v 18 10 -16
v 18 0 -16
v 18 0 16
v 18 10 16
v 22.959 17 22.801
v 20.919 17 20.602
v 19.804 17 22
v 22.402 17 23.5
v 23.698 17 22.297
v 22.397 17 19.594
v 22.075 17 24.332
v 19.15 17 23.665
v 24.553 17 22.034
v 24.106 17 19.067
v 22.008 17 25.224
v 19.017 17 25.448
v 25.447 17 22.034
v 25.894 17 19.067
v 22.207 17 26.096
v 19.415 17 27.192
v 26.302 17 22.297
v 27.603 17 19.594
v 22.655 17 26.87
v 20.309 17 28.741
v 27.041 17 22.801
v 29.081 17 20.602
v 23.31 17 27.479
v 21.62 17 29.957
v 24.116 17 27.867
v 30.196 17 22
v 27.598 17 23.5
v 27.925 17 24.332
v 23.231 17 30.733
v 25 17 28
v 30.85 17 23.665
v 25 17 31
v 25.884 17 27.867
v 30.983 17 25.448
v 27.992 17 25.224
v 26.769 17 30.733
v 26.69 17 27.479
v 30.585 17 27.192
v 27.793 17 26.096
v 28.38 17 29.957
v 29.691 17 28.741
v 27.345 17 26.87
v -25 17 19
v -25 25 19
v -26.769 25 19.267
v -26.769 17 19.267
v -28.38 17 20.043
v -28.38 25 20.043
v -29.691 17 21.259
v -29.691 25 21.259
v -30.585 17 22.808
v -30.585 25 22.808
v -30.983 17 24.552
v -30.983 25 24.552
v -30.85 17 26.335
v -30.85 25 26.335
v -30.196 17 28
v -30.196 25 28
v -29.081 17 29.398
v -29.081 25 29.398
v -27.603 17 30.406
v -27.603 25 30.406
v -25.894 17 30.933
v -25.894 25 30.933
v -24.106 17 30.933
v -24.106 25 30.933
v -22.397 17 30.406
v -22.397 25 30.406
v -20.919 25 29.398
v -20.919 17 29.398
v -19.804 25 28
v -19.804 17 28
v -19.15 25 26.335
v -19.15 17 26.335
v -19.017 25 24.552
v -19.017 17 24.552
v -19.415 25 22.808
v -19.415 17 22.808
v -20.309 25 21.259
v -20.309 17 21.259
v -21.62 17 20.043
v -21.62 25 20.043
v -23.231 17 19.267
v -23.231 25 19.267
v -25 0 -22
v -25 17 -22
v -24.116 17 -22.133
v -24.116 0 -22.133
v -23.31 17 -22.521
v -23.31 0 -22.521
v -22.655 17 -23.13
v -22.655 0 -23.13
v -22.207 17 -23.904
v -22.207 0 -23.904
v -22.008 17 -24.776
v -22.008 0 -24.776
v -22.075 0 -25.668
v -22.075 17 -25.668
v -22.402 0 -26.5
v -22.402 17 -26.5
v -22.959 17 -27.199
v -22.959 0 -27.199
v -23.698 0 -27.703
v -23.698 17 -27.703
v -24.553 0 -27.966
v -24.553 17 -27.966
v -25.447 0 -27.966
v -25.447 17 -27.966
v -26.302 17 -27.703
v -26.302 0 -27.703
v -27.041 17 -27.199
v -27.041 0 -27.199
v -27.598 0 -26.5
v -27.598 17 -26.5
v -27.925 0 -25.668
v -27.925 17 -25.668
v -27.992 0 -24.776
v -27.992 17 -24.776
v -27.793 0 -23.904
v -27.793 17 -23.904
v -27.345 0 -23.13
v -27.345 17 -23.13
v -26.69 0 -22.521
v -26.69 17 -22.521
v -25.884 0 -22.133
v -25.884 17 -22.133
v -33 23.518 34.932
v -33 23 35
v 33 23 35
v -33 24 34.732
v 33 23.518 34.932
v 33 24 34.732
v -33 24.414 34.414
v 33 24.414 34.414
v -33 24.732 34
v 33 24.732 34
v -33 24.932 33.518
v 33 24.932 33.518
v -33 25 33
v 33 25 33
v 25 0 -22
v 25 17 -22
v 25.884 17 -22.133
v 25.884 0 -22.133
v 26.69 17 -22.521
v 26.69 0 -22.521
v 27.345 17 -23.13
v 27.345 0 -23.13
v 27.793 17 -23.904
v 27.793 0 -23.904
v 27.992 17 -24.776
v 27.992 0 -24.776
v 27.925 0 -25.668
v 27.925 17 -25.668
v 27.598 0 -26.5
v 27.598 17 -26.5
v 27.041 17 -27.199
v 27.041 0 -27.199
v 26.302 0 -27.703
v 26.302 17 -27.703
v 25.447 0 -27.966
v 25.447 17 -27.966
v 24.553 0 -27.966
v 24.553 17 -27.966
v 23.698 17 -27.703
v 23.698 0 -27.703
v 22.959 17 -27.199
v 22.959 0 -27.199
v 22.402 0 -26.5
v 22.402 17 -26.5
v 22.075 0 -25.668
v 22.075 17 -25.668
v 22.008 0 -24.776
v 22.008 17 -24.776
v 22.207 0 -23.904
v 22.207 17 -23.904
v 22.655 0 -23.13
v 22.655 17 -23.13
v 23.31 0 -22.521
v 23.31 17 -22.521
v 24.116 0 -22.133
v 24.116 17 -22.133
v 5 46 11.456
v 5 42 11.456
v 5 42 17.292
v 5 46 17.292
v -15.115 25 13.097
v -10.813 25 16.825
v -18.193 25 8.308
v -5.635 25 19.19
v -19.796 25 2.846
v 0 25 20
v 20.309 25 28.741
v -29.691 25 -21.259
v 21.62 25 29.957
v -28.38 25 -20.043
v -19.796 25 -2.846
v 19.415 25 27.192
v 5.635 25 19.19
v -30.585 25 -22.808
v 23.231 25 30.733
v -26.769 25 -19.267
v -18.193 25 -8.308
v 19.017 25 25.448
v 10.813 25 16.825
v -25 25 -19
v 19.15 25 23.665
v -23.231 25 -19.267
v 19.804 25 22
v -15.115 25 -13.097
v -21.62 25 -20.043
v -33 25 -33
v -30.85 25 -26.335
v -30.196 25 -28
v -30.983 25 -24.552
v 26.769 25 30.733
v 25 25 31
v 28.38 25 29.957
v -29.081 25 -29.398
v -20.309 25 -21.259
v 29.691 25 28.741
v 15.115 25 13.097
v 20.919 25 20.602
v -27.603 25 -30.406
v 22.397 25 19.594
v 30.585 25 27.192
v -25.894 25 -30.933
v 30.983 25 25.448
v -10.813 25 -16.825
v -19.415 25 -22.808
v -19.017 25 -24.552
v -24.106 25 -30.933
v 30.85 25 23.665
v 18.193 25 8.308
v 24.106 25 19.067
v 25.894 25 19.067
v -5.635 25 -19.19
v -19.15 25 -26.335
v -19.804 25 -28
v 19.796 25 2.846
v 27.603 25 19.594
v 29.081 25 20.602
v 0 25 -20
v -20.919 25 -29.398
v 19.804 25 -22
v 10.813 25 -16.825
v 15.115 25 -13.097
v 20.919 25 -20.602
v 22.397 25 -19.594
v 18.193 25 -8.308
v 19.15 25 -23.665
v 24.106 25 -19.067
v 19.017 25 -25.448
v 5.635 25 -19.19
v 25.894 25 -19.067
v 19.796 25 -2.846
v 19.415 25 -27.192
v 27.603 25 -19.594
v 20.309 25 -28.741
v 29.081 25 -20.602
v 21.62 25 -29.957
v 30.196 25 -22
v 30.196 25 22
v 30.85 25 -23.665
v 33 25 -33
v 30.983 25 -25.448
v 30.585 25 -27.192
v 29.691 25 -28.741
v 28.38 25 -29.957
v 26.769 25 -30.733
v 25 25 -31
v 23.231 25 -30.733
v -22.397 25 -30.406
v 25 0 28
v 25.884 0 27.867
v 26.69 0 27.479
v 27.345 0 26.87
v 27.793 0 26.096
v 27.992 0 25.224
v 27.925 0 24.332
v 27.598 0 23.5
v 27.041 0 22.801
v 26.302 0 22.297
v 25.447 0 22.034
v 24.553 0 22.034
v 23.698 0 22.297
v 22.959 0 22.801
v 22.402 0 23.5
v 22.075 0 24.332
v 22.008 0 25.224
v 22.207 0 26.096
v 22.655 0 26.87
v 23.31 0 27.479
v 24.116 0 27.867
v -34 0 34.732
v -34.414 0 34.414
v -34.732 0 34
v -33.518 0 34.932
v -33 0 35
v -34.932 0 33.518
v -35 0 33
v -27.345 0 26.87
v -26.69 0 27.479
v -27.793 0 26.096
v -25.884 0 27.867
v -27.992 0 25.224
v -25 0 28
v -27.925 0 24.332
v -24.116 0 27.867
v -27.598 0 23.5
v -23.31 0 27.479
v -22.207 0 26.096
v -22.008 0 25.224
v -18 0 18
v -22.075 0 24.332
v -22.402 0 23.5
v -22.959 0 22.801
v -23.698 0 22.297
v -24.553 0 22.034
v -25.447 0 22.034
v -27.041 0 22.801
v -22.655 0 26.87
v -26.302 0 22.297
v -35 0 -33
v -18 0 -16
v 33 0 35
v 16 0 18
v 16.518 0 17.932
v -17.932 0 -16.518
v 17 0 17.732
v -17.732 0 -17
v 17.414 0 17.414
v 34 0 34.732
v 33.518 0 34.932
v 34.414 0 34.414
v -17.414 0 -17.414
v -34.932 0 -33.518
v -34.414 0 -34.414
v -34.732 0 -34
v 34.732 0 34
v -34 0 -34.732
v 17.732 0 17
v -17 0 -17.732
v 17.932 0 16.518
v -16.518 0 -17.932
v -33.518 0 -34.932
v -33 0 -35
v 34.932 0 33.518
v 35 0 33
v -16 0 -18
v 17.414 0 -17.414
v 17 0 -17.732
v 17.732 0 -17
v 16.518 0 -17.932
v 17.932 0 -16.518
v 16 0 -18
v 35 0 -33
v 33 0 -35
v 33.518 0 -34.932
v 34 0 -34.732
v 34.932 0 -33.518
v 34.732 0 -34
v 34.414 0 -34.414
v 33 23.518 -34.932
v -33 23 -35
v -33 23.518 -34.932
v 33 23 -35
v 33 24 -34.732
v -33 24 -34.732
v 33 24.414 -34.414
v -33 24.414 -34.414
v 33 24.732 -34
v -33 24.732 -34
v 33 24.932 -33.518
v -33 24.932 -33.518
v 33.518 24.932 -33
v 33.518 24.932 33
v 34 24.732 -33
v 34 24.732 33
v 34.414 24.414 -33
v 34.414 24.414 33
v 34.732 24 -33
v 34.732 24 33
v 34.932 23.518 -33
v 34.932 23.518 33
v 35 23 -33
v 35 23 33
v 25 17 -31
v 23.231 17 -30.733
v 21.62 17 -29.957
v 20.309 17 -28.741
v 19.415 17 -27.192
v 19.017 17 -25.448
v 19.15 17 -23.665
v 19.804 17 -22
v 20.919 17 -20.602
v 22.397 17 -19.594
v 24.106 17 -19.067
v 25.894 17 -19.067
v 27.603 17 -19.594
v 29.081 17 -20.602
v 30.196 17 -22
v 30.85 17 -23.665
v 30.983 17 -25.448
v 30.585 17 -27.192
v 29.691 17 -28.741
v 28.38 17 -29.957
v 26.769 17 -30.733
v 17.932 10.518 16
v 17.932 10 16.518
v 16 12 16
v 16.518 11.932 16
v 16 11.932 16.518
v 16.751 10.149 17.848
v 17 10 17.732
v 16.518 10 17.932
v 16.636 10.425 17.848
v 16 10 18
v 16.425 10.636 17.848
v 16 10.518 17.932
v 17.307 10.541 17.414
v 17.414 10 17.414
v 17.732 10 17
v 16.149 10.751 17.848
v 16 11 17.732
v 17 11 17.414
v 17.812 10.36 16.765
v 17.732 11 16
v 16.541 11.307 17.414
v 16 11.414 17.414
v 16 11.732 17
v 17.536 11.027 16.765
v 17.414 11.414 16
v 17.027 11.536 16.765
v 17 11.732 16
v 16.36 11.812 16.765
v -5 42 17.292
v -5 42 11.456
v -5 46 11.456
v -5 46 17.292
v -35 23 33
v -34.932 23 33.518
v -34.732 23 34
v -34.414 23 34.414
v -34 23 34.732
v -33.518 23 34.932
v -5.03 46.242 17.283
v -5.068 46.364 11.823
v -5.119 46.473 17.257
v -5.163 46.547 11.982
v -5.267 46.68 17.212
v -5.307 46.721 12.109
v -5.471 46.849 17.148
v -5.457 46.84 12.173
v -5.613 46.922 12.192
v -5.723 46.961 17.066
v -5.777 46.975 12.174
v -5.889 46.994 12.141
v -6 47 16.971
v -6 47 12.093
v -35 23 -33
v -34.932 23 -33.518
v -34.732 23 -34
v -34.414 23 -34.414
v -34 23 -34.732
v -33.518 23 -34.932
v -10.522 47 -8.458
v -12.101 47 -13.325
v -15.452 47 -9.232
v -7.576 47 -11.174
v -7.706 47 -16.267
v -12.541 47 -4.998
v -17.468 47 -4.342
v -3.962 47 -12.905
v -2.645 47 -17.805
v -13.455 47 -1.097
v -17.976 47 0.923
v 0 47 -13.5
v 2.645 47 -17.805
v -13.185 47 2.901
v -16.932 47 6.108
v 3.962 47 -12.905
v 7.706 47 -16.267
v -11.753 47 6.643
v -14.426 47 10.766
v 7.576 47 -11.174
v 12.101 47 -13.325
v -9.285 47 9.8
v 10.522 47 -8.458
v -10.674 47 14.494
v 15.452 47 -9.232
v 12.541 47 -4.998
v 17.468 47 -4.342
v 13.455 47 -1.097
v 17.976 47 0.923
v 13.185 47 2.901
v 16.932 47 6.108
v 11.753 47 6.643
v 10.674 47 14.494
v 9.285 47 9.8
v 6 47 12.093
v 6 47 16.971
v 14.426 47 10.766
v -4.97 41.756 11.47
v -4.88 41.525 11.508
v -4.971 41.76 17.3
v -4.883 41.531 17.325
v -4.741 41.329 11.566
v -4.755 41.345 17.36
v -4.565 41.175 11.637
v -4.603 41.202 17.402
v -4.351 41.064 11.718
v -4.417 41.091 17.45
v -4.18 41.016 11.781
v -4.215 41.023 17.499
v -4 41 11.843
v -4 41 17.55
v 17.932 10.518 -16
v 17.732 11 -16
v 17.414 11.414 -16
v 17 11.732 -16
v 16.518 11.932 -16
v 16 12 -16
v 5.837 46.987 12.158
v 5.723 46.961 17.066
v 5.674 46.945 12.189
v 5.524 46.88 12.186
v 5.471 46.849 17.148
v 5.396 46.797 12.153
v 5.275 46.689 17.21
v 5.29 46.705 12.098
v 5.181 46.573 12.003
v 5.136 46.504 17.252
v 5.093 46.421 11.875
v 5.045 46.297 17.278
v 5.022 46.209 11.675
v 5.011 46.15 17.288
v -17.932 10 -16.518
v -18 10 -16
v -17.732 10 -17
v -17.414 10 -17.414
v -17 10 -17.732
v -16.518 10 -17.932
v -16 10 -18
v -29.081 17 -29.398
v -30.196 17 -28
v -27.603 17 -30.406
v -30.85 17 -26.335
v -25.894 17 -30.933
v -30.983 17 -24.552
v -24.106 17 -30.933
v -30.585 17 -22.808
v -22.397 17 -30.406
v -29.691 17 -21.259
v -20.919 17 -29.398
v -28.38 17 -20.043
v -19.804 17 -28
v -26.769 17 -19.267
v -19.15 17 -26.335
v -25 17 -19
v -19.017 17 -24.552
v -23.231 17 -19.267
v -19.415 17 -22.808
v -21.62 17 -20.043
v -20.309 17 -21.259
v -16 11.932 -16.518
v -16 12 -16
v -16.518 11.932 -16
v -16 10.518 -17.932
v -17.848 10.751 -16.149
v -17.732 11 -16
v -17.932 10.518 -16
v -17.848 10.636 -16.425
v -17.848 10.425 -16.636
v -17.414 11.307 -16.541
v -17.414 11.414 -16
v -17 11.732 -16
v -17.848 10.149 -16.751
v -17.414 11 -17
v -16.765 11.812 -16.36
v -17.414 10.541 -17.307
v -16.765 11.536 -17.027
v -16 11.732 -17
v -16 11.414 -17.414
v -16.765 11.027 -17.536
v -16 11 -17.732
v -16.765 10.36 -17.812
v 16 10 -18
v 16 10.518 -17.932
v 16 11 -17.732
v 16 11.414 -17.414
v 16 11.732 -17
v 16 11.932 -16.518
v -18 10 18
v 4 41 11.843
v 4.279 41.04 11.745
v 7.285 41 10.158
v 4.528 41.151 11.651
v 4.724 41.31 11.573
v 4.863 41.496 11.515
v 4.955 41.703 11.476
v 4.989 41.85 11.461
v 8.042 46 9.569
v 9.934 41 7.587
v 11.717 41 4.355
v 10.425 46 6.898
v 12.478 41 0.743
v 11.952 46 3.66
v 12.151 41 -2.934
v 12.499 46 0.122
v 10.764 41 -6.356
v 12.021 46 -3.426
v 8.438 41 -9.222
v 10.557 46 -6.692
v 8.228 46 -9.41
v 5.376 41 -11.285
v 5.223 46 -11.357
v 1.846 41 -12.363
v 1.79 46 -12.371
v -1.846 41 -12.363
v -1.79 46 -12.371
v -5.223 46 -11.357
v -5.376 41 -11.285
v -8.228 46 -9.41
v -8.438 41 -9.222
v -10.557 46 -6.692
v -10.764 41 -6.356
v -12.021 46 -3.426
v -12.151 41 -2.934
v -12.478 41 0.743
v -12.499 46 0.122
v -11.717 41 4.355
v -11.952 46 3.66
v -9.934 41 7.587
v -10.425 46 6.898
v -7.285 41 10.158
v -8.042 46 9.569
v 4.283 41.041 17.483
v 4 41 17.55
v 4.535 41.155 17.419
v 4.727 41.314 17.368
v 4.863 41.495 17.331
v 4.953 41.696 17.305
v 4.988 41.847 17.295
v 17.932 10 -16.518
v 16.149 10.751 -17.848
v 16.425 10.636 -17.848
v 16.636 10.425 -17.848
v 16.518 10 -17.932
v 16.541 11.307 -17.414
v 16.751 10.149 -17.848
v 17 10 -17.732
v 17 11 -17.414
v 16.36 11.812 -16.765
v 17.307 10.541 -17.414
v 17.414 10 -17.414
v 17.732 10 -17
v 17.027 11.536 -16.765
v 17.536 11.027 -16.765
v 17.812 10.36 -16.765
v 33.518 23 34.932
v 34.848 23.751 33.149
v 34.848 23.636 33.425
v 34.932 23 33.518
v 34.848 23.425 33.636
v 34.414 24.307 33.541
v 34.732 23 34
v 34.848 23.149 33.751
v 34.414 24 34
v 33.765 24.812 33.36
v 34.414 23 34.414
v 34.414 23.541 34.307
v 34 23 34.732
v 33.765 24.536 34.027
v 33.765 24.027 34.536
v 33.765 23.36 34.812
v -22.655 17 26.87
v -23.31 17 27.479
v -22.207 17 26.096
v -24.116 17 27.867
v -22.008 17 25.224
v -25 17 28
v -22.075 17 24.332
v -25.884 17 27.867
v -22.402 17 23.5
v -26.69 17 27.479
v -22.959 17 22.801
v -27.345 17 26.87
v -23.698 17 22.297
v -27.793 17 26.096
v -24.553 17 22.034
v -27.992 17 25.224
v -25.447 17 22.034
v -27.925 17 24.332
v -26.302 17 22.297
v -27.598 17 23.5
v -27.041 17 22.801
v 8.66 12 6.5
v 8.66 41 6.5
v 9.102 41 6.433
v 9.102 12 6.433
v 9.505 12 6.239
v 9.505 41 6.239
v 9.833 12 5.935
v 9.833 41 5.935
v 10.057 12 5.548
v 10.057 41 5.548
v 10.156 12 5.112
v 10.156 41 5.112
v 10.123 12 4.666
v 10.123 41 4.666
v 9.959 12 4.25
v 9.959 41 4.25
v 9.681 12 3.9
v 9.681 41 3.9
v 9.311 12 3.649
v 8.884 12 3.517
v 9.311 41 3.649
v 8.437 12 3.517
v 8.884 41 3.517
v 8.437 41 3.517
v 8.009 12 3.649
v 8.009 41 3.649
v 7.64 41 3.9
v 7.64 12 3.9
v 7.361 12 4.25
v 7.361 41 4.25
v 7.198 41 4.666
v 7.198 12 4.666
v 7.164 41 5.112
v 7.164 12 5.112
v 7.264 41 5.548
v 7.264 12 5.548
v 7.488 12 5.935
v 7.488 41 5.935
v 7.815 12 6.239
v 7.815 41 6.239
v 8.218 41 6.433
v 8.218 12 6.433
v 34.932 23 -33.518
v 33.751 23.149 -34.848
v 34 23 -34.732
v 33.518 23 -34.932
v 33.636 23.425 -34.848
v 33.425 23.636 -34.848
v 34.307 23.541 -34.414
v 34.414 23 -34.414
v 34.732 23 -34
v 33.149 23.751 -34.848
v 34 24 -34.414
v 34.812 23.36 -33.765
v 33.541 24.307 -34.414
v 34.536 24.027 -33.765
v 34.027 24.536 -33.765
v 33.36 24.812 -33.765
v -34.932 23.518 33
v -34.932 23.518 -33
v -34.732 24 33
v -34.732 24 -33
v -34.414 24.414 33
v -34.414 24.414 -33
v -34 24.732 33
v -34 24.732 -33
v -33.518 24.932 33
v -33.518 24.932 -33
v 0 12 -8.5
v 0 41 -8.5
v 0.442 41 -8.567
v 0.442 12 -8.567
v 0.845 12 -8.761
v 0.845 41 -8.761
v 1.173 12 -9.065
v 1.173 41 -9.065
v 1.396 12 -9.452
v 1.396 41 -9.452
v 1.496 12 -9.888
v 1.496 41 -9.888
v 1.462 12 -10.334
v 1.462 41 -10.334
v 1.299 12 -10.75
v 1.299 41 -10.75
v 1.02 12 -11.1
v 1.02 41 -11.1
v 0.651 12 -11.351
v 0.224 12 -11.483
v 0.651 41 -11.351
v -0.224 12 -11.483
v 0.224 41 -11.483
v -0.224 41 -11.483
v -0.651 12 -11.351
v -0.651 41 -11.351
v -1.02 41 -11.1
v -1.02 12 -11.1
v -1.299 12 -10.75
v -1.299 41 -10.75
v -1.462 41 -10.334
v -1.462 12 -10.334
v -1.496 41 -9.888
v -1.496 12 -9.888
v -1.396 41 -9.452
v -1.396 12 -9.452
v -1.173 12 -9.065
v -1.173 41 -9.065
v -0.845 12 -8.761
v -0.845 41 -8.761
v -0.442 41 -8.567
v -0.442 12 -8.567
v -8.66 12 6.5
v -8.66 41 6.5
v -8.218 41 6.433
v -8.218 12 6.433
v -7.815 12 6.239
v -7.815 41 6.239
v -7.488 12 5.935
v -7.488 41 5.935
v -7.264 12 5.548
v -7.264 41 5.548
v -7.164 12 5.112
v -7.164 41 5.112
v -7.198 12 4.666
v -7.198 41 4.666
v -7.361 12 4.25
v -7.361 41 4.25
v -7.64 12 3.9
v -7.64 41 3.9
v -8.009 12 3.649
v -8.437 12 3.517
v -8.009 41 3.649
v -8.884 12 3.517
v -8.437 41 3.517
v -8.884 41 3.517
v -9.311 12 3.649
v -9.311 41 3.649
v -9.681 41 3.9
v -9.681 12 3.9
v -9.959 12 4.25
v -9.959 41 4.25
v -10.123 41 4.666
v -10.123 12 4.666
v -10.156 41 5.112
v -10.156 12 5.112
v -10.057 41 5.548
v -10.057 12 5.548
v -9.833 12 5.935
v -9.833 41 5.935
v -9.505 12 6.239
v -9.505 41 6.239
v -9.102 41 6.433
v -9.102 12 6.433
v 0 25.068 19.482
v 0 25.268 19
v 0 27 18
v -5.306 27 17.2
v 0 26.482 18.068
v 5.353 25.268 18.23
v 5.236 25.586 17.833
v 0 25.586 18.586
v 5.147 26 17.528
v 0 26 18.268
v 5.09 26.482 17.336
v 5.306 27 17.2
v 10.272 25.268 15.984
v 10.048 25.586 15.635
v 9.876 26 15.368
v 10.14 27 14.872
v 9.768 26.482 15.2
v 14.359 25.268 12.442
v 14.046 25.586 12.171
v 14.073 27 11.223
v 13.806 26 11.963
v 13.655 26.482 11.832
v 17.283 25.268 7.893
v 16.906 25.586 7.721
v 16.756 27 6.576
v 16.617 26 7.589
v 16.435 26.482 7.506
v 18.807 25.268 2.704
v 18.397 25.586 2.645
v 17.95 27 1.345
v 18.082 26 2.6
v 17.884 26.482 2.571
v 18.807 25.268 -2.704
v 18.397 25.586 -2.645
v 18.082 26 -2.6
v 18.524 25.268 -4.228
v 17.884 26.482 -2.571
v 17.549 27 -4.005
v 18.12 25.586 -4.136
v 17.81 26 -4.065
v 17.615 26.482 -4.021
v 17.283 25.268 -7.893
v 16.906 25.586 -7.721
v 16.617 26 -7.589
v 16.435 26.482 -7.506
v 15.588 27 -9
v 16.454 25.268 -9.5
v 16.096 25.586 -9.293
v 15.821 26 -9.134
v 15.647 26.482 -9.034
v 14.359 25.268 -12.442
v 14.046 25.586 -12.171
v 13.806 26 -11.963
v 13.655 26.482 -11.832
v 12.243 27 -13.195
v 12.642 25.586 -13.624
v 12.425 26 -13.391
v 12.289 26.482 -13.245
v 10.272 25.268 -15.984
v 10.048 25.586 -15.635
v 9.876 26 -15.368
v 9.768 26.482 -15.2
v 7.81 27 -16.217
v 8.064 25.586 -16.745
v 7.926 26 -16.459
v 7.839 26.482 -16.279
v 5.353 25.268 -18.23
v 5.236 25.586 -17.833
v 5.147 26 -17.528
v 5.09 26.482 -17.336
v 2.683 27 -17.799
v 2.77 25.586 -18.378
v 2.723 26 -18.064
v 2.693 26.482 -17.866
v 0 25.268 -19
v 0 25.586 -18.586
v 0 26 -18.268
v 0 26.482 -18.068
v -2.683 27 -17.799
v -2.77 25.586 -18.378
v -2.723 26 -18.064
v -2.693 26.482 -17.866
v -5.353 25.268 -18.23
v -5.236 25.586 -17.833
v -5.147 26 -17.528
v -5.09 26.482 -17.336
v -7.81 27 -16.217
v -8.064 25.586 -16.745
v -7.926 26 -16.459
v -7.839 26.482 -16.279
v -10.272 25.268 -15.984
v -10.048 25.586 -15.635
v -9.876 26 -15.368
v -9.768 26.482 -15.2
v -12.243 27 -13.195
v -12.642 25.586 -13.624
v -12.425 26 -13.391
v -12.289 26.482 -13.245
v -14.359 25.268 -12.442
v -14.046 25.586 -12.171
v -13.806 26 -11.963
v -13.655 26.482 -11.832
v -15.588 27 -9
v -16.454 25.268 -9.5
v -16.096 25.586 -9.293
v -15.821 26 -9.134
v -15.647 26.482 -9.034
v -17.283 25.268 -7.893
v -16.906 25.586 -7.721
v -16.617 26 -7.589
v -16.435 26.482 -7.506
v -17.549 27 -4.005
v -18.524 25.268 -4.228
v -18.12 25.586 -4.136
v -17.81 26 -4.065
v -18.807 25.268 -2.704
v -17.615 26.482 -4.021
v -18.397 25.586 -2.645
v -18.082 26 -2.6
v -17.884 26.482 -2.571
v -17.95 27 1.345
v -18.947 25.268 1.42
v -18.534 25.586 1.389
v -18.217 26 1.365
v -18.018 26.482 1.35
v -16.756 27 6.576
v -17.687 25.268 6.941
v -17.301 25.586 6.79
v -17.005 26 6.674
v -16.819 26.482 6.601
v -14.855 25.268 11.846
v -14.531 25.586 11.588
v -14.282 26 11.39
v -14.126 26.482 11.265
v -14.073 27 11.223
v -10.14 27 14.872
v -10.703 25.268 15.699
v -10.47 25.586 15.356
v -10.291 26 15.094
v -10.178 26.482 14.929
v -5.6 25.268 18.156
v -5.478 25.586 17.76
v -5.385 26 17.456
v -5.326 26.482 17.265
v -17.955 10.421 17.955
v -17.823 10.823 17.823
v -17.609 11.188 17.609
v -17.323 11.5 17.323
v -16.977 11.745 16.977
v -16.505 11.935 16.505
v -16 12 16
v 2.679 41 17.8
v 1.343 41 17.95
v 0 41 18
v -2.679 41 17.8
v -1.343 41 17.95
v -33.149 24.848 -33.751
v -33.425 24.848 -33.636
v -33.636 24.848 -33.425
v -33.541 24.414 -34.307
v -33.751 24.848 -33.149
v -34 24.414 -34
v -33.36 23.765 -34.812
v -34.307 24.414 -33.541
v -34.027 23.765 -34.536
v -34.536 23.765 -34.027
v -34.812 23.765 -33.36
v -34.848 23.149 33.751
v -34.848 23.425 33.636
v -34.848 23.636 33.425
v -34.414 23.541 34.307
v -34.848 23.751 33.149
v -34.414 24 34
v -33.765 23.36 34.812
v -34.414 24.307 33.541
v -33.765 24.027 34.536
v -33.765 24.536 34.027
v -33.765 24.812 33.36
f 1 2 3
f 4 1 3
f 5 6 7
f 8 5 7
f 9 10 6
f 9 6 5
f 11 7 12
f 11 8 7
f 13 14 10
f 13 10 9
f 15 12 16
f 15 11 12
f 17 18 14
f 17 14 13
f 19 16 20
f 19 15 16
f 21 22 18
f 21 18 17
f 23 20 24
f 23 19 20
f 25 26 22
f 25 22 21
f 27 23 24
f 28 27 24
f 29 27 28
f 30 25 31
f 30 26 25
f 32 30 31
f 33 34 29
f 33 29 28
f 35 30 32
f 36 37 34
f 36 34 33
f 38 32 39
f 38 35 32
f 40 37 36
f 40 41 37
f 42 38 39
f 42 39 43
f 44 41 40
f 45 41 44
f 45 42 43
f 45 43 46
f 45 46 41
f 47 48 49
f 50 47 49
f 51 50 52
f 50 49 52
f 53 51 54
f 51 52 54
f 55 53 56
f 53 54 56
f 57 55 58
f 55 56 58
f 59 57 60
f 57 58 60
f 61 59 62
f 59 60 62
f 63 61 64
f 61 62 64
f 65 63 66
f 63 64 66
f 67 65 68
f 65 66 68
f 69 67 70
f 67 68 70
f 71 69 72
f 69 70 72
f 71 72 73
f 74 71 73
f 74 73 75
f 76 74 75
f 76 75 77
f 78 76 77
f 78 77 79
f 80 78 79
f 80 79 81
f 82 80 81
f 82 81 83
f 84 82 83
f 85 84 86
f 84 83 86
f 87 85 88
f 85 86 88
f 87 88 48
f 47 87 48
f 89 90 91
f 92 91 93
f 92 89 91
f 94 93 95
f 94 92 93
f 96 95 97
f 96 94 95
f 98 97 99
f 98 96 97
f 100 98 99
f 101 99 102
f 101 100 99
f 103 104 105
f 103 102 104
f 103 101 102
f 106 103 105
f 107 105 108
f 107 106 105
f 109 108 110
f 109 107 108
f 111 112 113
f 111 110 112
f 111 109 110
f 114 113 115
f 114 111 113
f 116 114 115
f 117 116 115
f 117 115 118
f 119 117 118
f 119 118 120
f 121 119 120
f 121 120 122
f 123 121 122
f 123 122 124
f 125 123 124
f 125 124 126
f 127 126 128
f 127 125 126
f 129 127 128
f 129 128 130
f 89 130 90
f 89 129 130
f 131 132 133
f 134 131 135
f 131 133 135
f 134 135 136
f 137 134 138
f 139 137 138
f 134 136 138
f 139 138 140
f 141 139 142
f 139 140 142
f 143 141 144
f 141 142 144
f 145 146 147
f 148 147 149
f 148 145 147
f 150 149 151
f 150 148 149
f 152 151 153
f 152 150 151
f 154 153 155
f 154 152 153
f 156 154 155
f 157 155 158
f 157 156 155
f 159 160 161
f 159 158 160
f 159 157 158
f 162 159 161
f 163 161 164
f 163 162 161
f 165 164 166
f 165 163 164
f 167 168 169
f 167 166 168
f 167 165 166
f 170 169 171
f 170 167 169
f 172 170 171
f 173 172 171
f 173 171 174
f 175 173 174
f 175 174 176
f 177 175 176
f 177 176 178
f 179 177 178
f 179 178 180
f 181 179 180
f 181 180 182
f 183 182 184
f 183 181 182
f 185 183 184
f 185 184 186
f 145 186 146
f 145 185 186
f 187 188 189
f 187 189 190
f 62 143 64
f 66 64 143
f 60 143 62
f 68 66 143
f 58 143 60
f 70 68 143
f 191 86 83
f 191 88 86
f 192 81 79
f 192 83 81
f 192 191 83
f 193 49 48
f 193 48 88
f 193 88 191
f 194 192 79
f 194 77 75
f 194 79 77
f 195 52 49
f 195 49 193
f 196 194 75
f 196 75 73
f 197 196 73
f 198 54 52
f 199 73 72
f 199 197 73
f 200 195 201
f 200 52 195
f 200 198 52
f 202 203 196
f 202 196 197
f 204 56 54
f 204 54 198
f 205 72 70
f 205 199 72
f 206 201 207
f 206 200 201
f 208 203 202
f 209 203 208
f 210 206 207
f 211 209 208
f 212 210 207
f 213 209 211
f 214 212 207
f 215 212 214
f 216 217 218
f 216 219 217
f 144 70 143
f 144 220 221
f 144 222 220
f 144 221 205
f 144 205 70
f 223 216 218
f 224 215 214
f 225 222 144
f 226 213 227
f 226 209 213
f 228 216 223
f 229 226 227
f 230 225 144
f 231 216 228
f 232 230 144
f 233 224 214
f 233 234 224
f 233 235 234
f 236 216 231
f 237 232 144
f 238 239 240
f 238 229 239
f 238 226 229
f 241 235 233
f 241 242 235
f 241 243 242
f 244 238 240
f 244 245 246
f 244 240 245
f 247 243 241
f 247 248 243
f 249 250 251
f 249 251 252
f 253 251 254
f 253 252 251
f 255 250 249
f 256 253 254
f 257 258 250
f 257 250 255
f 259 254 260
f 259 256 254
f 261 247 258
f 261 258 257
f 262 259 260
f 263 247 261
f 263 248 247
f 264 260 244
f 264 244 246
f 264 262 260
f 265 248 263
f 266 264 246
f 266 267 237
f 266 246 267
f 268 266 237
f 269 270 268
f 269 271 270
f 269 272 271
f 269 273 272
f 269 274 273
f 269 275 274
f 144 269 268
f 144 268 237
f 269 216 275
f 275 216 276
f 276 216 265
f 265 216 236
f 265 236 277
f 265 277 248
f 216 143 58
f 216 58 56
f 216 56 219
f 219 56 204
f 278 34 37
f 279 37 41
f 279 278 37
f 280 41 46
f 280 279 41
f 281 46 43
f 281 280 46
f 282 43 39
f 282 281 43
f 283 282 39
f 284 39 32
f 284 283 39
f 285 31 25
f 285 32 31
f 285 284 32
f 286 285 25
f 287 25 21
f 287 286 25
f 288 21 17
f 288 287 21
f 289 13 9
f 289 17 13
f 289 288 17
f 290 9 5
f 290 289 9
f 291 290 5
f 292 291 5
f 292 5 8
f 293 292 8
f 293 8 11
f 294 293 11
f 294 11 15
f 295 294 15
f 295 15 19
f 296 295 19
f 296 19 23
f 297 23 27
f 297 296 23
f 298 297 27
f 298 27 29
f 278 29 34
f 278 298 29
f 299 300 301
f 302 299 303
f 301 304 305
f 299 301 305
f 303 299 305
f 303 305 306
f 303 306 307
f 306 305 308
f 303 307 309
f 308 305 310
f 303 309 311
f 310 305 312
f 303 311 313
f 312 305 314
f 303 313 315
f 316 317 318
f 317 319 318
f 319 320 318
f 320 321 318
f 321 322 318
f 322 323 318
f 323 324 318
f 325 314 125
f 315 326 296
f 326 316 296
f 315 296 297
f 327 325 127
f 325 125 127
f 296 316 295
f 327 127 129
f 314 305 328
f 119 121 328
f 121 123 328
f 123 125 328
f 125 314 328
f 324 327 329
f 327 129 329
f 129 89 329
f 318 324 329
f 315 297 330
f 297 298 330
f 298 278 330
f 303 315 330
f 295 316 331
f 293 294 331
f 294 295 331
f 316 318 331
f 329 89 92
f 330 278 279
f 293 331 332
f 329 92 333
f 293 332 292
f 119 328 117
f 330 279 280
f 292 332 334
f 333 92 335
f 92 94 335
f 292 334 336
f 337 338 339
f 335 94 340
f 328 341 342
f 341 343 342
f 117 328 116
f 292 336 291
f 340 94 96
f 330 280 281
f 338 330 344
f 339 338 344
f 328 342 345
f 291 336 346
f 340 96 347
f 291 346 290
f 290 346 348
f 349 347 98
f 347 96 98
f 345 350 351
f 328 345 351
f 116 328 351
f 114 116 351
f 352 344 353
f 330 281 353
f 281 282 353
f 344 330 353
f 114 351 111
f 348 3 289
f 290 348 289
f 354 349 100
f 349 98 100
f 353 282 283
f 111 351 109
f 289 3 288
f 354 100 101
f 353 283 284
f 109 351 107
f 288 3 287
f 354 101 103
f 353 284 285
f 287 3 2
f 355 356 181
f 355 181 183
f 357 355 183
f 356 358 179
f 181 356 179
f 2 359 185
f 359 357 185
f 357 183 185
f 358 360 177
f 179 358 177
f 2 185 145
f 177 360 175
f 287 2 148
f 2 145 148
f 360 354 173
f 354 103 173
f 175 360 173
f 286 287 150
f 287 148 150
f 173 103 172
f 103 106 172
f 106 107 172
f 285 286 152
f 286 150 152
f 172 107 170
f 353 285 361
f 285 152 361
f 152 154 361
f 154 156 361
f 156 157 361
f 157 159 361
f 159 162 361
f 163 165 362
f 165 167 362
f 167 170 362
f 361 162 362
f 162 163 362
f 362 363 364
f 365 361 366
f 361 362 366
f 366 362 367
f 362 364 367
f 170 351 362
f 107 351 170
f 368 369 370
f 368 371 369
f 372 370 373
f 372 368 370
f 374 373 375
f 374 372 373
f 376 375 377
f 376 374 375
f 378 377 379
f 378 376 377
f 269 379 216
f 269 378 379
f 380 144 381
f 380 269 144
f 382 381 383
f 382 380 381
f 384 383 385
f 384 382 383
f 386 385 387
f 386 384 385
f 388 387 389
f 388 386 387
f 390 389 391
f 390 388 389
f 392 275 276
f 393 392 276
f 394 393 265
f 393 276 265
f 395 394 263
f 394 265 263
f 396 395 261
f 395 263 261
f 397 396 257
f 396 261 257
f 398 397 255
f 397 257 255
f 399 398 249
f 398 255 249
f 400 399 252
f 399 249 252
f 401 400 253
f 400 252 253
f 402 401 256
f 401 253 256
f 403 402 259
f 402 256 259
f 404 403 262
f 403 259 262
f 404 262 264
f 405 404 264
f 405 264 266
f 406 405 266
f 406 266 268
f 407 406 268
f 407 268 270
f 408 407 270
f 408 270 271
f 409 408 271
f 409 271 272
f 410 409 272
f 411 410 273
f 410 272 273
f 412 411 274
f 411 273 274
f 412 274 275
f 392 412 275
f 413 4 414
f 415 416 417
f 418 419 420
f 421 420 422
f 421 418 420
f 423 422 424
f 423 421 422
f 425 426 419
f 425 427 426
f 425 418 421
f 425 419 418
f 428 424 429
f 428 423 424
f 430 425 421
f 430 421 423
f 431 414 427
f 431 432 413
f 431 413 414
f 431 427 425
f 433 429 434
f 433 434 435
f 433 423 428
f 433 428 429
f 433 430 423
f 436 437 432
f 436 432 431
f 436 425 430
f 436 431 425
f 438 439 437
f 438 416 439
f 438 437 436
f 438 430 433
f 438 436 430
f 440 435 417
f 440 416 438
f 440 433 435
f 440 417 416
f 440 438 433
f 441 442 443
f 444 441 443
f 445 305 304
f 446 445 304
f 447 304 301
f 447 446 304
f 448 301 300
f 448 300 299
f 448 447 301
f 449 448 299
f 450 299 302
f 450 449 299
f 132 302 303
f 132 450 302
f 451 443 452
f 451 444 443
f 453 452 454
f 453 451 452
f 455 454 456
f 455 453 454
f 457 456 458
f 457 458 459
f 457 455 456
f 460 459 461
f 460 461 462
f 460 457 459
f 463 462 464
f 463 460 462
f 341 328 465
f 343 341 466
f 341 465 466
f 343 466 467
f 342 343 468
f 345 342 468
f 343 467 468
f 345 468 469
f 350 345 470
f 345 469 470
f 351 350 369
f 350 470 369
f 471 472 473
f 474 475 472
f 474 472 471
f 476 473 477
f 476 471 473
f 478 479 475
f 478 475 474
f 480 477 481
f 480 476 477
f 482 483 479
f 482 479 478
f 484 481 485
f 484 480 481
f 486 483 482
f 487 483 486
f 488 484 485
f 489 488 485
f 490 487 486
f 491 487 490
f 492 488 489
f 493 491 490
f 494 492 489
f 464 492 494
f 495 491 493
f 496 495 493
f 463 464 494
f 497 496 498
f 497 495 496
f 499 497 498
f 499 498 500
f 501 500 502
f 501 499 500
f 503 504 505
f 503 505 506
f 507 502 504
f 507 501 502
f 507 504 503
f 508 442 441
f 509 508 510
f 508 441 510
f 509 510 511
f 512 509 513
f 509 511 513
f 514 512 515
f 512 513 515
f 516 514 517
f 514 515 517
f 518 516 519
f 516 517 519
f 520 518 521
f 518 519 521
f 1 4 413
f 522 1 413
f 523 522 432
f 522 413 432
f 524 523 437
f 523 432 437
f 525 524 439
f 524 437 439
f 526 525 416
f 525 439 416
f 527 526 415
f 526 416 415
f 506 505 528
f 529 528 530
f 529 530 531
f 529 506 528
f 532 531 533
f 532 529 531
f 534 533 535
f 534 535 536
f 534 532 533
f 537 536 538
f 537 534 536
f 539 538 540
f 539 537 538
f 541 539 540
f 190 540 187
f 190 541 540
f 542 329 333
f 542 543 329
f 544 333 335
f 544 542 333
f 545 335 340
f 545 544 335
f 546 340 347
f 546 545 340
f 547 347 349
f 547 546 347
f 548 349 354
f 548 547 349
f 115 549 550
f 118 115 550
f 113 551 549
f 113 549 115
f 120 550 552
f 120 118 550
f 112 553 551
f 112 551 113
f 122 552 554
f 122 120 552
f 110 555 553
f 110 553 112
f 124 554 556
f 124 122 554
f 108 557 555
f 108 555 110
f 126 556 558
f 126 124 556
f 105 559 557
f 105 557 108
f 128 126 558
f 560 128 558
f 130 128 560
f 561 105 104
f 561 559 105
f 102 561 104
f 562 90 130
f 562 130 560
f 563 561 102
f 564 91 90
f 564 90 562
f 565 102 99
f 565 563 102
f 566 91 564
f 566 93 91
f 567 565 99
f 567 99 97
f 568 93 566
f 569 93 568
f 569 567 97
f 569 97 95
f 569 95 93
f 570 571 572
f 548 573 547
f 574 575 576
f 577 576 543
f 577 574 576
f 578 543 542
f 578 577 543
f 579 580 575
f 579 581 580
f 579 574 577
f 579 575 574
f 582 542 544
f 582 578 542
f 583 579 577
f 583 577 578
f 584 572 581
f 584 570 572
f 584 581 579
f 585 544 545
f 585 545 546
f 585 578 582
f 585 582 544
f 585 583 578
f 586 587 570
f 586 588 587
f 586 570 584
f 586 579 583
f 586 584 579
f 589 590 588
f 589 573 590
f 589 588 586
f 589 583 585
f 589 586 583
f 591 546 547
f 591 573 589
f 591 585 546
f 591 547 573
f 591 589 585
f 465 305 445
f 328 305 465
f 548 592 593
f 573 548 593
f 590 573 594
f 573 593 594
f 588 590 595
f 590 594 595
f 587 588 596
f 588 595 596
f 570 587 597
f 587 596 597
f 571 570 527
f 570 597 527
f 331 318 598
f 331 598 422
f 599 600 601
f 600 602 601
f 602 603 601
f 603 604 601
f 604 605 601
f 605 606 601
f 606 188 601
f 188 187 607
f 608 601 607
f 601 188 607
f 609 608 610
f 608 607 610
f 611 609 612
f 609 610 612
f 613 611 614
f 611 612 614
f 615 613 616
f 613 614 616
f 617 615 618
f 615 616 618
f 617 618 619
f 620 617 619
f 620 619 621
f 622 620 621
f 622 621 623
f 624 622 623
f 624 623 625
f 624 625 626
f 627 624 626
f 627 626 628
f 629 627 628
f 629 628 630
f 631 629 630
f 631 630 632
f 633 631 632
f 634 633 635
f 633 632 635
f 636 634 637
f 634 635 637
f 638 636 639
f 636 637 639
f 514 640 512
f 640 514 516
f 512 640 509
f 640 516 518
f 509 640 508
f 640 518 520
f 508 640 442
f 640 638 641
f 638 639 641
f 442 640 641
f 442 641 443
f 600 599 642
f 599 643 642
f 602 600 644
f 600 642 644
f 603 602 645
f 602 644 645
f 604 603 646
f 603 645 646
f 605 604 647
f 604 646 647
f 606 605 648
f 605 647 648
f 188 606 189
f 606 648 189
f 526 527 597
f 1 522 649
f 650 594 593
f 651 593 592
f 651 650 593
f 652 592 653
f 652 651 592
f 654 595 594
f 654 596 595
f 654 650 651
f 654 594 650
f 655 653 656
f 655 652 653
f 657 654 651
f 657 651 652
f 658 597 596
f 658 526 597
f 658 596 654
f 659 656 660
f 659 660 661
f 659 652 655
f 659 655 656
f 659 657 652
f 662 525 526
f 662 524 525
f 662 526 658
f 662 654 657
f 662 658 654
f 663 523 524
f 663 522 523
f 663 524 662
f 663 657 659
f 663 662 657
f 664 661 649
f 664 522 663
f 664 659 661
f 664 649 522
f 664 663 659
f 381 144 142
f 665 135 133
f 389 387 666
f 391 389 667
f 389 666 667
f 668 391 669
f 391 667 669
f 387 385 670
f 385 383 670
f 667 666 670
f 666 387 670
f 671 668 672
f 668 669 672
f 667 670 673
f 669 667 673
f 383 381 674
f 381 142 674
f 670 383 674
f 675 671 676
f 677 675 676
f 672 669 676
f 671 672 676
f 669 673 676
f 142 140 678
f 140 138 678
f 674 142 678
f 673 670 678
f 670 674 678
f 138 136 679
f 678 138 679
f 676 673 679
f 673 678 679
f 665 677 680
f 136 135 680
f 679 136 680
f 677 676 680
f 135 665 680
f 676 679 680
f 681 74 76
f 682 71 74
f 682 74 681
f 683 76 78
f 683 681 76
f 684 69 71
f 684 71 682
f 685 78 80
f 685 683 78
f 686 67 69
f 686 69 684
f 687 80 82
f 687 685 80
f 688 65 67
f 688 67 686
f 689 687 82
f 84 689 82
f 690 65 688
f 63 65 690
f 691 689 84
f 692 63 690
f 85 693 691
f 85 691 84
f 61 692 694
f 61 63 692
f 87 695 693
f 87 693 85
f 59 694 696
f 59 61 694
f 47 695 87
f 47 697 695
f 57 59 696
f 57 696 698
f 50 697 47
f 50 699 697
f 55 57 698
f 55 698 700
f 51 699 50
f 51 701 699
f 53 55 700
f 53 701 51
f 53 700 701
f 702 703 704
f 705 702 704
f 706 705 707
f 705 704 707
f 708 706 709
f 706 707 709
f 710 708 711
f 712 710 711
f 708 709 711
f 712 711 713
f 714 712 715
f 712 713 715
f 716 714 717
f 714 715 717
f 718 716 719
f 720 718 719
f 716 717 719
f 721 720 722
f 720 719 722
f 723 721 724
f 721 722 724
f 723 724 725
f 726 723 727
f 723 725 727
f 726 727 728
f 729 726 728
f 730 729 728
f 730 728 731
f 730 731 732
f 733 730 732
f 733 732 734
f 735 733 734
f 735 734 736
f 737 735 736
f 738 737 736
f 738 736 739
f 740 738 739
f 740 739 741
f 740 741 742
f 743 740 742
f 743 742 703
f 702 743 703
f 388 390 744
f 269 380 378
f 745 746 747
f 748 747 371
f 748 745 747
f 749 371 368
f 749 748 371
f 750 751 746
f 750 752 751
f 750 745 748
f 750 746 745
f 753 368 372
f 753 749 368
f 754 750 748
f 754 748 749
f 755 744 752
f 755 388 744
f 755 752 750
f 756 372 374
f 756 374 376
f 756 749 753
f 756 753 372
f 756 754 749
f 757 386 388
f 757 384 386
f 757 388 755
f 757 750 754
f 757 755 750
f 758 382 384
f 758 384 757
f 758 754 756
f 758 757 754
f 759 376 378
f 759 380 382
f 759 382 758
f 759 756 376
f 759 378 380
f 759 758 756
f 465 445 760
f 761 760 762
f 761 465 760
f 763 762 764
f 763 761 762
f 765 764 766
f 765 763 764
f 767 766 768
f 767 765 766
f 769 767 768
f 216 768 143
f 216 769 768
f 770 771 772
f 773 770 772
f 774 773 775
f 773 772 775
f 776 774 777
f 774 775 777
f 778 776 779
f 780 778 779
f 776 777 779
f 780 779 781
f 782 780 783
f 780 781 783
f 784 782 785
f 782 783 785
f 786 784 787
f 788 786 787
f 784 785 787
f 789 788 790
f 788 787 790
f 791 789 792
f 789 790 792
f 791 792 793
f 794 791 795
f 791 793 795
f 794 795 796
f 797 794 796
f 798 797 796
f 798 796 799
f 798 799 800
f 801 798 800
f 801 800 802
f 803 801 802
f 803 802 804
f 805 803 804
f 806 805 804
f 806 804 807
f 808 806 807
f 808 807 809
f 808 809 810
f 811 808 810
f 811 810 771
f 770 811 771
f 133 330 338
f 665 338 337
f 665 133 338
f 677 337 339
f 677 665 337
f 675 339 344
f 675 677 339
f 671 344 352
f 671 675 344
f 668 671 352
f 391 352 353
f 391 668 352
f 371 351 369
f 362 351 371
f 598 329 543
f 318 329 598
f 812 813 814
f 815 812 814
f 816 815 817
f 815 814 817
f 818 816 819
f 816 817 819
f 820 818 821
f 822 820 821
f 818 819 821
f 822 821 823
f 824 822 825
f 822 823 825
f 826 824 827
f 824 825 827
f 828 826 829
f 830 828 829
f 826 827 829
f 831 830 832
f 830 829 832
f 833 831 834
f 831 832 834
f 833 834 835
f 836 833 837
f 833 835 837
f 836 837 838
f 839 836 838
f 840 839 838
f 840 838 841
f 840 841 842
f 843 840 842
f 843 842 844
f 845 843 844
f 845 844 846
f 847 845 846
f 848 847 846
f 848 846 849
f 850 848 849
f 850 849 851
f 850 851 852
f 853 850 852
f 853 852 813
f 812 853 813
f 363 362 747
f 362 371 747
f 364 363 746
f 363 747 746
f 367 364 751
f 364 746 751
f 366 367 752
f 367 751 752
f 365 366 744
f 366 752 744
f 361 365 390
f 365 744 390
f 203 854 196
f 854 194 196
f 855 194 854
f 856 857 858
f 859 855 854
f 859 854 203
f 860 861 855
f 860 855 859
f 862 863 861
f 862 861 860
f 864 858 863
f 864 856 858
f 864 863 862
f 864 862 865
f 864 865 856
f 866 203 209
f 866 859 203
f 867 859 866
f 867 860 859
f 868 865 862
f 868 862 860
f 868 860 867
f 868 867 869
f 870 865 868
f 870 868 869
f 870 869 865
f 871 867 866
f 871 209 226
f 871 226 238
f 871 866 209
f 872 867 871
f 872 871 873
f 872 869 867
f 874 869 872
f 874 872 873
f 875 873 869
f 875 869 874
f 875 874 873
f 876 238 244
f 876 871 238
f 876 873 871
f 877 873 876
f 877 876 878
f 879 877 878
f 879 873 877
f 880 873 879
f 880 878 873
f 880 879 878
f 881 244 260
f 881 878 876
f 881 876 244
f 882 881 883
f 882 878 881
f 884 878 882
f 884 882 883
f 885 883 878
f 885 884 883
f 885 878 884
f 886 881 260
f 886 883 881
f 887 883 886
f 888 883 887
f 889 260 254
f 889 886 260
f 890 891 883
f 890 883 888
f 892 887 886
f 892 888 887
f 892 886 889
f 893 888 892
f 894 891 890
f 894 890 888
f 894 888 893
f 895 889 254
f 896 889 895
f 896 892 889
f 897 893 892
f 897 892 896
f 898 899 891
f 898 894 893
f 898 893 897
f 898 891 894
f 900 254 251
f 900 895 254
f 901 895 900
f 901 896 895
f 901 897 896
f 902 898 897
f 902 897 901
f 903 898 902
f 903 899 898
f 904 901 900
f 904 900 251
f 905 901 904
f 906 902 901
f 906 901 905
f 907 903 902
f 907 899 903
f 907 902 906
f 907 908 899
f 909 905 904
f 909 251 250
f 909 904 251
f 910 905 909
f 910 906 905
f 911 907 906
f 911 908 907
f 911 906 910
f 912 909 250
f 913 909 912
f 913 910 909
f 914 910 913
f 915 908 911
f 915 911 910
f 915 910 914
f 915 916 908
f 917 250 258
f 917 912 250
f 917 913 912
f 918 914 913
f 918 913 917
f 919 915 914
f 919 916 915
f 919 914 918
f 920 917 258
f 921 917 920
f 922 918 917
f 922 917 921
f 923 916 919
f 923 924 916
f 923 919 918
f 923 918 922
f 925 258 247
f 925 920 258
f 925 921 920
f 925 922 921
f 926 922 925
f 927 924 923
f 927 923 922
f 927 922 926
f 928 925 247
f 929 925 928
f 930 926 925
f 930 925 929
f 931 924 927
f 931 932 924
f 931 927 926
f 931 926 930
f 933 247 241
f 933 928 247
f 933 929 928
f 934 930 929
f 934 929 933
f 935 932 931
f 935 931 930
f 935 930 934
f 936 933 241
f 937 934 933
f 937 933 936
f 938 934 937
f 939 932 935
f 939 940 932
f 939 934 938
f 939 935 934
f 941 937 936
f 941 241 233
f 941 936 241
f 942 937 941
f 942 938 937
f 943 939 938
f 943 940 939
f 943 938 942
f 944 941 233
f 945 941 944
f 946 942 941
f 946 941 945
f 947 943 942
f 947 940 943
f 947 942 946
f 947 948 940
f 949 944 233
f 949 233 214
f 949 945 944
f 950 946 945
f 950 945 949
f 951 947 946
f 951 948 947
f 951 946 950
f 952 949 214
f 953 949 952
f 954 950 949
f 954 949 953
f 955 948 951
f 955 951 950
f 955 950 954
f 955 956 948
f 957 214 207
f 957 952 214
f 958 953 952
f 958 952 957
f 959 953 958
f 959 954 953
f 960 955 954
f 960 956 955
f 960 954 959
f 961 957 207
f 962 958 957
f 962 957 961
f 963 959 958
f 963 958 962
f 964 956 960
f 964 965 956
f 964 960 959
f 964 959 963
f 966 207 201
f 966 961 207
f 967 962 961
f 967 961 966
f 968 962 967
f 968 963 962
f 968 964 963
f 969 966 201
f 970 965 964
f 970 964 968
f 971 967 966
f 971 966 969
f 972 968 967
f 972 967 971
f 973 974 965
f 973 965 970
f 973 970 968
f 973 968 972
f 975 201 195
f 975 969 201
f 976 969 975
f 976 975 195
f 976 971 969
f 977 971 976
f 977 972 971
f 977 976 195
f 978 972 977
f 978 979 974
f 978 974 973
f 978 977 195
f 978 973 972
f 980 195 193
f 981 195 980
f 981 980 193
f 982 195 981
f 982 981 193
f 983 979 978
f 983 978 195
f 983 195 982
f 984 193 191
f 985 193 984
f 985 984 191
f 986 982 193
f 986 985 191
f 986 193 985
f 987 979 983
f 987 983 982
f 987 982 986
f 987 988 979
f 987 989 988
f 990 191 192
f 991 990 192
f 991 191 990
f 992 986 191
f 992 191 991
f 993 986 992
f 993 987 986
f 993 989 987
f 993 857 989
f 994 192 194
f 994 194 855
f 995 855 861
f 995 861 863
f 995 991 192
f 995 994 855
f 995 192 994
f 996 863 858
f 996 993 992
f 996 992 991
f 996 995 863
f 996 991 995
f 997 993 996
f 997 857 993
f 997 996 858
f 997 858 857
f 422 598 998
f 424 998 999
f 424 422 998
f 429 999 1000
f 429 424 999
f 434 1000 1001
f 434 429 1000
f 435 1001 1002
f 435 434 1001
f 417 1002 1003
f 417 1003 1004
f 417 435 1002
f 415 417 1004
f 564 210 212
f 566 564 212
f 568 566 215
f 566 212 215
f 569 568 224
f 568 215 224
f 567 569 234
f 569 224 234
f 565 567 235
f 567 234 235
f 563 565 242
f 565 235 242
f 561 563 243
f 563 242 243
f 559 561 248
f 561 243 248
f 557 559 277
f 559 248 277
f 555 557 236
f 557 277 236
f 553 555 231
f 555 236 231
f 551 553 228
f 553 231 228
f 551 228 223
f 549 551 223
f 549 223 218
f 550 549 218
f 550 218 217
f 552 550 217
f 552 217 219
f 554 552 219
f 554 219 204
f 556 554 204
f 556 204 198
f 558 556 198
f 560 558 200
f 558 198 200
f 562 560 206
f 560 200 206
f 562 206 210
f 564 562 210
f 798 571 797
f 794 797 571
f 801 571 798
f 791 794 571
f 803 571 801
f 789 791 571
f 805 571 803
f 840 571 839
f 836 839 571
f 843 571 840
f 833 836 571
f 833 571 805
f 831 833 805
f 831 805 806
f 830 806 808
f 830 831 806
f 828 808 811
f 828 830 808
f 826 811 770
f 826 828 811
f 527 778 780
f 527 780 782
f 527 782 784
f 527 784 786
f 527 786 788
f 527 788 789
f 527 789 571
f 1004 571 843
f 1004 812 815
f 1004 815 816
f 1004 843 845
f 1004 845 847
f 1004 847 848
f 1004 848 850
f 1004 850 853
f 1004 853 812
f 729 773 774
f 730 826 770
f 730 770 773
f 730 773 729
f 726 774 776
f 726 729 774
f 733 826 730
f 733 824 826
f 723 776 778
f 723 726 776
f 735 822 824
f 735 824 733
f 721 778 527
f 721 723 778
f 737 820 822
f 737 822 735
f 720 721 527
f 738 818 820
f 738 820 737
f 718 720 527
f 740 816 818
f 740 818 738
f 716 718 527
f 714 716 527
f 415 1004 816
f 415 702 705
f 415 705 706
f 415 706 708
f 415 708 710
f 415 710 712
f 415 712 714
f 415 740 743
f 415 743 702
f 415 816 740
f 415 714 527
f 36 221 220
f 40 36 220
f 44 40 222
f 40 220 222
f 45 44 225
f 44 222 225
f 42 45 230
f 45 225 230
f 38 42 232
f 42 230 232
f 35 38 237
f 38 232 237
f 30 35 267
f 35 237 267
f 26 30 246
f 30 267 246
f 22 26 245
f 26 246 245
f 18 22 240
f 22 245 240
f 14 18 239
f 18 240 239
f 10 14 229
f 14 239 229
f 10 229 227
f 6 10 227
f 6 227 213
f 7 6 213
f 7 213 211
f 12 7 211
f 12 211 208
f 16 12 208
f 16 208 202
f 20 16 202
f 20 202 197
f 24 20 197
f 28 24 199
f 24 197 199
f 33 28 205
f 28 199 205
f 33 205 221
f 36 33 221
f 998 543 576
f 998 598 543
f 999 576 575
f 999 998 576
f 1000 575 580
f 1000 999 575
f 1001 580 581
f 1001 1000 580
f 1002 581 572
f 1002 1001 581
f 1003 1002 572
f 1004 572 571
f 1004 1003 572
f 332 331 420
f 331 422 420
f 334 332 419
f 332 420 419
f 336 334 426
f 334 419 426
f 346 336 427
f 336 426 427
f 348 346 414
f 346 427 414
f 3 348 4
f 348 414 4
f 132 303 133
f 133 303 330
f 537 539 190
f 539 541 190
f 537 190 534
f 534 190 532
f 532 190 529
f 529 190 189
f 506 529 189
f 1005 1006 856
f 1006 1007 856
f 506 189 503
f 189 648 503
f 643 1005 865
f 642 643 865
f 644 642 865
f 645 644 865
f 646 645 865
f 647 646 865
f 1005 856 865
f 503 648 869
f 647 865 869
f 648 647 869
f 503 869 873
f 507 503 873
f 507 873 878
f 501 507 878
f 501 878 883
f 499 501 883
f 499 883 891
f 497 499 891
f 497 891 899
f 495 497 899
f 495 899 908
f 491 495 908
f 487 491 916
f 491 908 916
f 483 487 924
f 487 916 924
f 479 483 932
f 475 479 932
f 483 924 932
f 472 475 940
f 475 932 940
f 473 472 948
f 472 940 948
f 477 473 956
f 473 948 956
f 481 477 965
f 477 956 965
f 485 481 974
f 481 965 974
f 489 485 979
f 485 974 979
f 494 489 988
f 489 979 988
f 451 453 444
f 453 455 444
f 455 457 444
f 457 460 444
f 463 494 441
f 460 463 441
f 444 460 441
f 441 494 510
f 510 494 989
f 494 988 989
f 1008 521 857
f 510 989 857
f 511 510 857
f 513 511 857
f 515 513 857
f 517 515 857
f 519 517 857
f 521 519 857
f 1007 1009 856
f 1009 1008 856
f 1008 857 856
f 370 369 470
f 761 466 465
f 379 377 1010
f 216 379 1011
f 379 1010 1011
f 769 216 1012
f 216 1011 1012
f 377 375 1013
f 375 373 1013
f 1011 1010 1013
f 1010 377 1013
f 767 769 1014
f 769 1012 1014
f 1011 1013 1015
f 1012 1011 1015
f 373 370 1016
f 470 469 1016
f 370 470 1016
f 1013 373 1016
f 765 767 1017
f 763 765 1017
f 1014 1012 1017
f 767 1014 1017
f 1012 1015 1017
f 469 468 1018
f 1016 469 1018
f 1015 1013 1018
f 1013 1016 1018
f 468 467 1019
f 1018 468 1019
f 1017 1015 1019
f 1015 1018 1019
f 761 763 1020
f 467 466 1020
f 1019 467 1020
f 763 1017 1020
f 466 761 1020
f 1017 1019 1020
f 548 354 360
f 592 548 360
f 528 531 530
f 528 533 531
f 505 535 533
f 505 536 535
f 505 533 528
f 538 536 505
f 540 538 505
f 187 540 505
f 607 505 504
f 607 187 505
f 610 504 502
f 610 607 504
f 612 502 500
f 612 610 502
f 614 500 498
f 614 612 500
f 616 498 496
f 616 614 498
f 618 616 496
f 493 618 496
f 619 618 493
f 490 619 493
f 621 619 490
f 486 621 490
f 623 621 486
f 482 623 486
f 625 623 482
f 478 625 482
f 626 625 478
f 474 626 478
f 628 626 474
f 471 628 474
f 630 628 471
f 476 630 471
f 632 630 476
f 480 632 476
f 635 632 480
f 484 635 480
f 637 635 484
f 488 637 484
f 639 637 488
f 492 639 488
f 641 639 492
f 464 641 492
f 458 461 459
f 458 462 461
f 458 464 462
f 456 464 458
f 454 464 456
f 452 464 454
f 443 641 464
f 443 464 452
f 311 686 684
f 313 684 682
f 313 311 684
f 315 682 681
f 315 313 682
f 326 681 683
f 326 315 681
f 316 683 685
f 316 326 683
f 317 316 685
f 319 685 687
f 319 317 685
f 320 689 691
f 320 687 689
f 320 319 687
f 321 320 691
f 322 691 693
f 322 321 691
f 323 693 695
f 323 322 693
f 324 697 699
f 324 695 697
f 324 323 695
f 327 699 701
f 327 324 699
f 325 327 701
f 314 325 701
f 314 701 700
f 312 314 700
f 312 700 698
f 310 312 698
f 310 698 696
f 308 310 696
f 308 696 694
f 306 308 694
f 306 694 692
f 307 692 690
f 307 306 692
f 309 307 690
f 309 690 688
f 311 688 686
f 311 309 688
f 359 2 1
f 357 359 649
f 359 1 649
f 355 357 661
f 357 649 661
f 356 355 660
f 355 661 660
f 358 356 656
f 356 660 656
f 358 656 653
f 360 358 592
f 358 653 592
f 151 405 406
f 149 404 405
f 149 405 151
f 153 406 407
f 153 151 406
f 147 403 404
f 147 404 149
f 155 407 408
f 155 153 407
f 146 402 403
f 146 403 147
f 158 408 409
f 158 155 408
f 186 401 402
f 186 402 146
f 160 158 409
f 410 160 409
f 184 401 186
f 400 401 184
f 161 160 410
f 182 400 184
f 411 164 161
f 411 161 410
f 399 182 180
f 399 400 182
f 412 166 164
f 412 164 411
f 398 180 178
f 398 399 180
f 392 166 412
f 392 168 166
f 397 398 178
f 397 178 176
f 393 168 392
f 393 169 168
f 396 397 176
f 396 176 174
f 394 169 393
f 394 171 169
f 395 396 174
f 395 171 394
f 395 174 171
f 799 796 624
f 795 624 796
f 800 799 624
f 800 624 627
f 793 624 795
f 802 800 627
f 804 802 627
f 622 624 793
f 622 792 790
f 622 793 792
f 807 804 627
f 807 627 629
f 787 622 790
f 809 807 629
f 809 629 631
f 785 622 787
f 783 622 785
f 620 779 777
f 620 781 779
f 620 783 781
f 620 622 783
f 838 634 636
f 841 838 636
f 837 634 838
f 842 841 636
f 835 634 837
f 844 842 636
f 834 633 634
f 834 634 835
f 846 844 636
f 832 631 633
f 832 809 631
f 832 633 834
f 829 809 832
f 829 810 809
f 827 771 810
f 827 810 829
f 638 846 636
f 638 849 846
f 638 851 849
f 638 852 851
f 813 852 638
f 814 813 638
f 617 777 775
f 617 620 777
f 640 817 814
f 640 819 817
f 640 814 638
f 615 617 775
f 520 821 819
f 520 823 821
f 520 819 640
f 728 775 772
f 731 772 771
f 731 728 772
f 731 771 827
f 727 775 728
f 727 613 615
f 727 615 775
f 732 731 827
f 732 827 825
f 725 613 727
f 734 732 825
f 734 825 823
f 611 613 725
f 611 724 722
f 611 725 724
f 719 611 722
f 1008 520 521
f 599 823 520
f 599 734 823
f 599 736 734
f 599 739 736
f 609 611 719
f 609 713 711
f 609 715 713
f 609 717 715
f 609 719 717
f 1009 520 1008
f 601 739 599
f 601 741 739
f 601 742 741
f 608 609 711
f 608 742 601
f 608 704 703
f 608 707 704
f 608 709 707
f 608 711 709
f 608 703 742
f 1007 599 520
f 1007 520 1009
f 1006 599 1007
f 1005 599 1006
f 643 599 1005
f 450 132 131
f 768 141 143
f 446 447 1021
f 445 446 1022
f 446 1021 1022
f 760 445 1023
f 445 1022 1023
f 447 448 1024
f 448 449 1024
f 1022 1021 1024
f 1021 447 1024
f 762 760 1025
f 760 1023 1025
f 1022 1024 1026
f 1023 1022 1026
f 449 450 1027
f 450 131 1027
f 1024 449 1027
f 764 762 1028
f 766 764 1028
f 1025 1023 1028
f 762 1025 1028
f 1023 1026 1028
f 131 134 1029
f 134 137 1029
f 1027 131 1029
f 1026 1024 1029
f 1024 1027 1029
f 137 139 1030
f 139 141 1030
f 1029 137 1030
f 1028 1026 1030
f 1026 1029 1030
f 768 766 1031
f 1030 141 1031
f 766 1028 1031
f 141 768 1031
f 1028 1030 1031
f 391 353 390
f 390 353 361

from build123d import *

# Parameters (mm, degrees)
SKETCH_1_W          = 70
SKETCH_1_H          = 70
EXTRUDE_1_DEPTH     = 25
SKETCH_2_R          = 18
EXTRUDE_2_DEPTH     = 22
SKETCH_3_R          = 12.5
CUT_EXTRUDE_1_DEPTH = 6
SKETCH_5_R          = 1.5
CUT_EXTRUDE_2_DEPTH = 65.272855857
SKETCH_6_W          = 10
SKETCH_6_H          = 12
CUT_EXTRUDE_3_DEPTH = 20
SKETCH_7_R          = 3
CUT_EXTRUDE_4_DEPTH = 69.256867786
SKETCH_8_R          = 6
CUT_EXTRUDE_5_DEPTH = 8
SKETCH_9_W          = 36
SKETCH_9_H          = 36
CUT_EXTRUDE_6_DEPTH = 12
FILLET_1_R          = 2
FILLET_2_R          = 2
CHAMFER_1_SIZE      = 1
FILLET_3_R          = 1


with BuildPart() as part:
    # 草图1 → 凸台-拉伸1 (new body)
    with BuildSketch(Plane(origin=(0, 0, 0), x_dir=(1, 0, 0), z_dir=(0, 1, 0))):
        Rectangle(SKETCH_1_W, SKETCH_1_H)
    extrude(amount=EXTRUDE_1_DEPTH)

    # 草图2 → 凸台-拉伸2 (add)
    with BuildSketch(Plane(origin=(0, 25, 0), x_dir=(1, 0, 0), z_dir=(0, 1, 0))):
        with Locations(Location((0, 0, 0), (0, 0, 270))):
            Circle(SKETCH_2_R)
    extrude(amount=EXTRUDE_2_DEPTH)

    # 草图3 → 切除-拉伸1 (cut)
    with BuildSketch(Plane(origin=(0, 47, 0), x_dir=(1, 0, 0), z_dir=(0, 1, 0))):
        with Locations(Location((0, 0, 0), (0, 0, 270))):
            Circle(SKETCH_3_R)
    extrude(amount=-CUT_EXTRUDE_1_DEPTH, mode=Mode.SUBTRACT)

    # 草图5 → 切除-拉伸2 (cut, through all)
    with BuildSketch(Plane(origin=(0, 41, 0), x_dir=(1, 0, 0), z_dir=(0, 1, 0))):
        with Locations(Location((0, 10, 0), (0, 0, 270))):
            Circle(SKETCH_5_R)
        with Locations(Location((8.660254038, -5, 0), (0, 0, 270))):
            Circle(SKETCH_5_R)
        with Locations(Location((-8.660254038, -5, 0), (0, 0, 270))):
            Circle(SKETCH_5_R)
    extrude(amount=-CUT_EXTRUDE_2_DEPTH, mode=Mode.SUBTRACT)

    # 草图6 → 切除-拉伸3 (cut)
    with BuildSketch(Plane.XY):
        with Locations((0, 47)):
            Rectangle(SKETCH_6_W, SKETCH_6_H)
    extrude(amount=CUT_EXTRUDE_3_DEPTH, mode=Mode.SUBTRACT)

    # 草图7 → 切除-拉伸4 (cut, through all)
    with BuildSketch(Plane(origin=(0, 0, 0), x_dir=(1, 0, 0), z_dir=(0, 1, 0))):
        with Locations(Location((-25, 25, 0), (0, 0, 270))):
            Circle(SKETCH_7_R)
        with Locations(Location((25, 25, 0), (0, 0, 270))):
            Circle(SKETCH_7_R)
        with Locations(Location((25, -25, 0), (0, 0, 270))):
            Circle(SKETCH_7_R)
        with Locations(Location((-25, -25, 0), (0, 0, 270))):
            Circle(SKETCH_7_R)
    extrude(amount=CUT_EXTRUDE_4_DEPTH, mode=Mode.SUBTRACT)

    # 草图8 → 切除-拉伸5 (cut)
    with BuildSketch(Plane(origin=(0, 25, 0), x_dir=(1, 0, 0), z_dir=(0, 1, 0))):
        with Locations(Location((-25, 25, 0), (0, 0, 270))):
            Circle(SKETCH_8_R)
        with Locations(Location((25, 25, 0), (0, 0, 90))):
            Circle(SKETCH_8_R)
        with Locations(Location((25, -25, 0), (0, 0, 270))):
            Circle(SKETCH_8_R)
        with Locations(Location((-25, -25, 0), (0, 0, 90))):
            Circle(SKETCH_8_R)
    extrude(amount=-CUT_EXTRUDE_5_DEPTH, mode=Mode.SUBTRACT)

    # 草图9 → 切除-拉伸6 (cut)
    with BuildSketch(Plane.XZ):
        Rectangle(SKETCH_9_W, SKETCH_9_H)
    extrude(amount=-CUT_EXTRUDE_6_DEPTH, mode=Mode.SUBTRACT)

    # 圆角1
    fillet_1_edges = [part.edges().sort_by_distance(p)[0] for p in [
        (0, 25, 35),
        (18, 12, 0),
        (18, 6, 18),
        (0, 12, -18),
        (18, 6, -18),
        (-18, 12, 0),
        (-18, 6, -18),
        (0, 12, 18),
        (35, 25, 0),
        (-35, 12.5, -35),
        (35, 12.5, -35),
        (35, 12.5, 35),
        (-35, 12.5, 35),
        (0, 25, -35),
        (-35, 25, 0),
    ]]
    fillet(fillet_1_edges, radius=FILLET_1_R)

    # 圆角2
    fillet_2_edges = [part.edges().sort_by_distance(p)[0] for p in [
        (0, 25, -18),
    ]]
    fillet(fillet_2_edges, radius=FILLET_2_R)

    # 倒角1
    chamfer_1_edges = [part.edges().sort_by_distance(p)[0] for p in [
        (0, 47, -12.5),
    ]]
    chamfer(chamfer_1_edges, length=CHAMFER_1_SIZE)

    # 圆角3
    fillet_3_edges = [part.edges().sort_by_distance(p)[0] for p in [
        (-5, 47, 14.915776335),
        (5, 47, 14.915776335),
        (5, 41, 14.374027852),
        (-5, 41, 14.374027852),
    ]]
    fillet(fillet_3_edges, radius=FILLET_3_R)


solid = part.part
